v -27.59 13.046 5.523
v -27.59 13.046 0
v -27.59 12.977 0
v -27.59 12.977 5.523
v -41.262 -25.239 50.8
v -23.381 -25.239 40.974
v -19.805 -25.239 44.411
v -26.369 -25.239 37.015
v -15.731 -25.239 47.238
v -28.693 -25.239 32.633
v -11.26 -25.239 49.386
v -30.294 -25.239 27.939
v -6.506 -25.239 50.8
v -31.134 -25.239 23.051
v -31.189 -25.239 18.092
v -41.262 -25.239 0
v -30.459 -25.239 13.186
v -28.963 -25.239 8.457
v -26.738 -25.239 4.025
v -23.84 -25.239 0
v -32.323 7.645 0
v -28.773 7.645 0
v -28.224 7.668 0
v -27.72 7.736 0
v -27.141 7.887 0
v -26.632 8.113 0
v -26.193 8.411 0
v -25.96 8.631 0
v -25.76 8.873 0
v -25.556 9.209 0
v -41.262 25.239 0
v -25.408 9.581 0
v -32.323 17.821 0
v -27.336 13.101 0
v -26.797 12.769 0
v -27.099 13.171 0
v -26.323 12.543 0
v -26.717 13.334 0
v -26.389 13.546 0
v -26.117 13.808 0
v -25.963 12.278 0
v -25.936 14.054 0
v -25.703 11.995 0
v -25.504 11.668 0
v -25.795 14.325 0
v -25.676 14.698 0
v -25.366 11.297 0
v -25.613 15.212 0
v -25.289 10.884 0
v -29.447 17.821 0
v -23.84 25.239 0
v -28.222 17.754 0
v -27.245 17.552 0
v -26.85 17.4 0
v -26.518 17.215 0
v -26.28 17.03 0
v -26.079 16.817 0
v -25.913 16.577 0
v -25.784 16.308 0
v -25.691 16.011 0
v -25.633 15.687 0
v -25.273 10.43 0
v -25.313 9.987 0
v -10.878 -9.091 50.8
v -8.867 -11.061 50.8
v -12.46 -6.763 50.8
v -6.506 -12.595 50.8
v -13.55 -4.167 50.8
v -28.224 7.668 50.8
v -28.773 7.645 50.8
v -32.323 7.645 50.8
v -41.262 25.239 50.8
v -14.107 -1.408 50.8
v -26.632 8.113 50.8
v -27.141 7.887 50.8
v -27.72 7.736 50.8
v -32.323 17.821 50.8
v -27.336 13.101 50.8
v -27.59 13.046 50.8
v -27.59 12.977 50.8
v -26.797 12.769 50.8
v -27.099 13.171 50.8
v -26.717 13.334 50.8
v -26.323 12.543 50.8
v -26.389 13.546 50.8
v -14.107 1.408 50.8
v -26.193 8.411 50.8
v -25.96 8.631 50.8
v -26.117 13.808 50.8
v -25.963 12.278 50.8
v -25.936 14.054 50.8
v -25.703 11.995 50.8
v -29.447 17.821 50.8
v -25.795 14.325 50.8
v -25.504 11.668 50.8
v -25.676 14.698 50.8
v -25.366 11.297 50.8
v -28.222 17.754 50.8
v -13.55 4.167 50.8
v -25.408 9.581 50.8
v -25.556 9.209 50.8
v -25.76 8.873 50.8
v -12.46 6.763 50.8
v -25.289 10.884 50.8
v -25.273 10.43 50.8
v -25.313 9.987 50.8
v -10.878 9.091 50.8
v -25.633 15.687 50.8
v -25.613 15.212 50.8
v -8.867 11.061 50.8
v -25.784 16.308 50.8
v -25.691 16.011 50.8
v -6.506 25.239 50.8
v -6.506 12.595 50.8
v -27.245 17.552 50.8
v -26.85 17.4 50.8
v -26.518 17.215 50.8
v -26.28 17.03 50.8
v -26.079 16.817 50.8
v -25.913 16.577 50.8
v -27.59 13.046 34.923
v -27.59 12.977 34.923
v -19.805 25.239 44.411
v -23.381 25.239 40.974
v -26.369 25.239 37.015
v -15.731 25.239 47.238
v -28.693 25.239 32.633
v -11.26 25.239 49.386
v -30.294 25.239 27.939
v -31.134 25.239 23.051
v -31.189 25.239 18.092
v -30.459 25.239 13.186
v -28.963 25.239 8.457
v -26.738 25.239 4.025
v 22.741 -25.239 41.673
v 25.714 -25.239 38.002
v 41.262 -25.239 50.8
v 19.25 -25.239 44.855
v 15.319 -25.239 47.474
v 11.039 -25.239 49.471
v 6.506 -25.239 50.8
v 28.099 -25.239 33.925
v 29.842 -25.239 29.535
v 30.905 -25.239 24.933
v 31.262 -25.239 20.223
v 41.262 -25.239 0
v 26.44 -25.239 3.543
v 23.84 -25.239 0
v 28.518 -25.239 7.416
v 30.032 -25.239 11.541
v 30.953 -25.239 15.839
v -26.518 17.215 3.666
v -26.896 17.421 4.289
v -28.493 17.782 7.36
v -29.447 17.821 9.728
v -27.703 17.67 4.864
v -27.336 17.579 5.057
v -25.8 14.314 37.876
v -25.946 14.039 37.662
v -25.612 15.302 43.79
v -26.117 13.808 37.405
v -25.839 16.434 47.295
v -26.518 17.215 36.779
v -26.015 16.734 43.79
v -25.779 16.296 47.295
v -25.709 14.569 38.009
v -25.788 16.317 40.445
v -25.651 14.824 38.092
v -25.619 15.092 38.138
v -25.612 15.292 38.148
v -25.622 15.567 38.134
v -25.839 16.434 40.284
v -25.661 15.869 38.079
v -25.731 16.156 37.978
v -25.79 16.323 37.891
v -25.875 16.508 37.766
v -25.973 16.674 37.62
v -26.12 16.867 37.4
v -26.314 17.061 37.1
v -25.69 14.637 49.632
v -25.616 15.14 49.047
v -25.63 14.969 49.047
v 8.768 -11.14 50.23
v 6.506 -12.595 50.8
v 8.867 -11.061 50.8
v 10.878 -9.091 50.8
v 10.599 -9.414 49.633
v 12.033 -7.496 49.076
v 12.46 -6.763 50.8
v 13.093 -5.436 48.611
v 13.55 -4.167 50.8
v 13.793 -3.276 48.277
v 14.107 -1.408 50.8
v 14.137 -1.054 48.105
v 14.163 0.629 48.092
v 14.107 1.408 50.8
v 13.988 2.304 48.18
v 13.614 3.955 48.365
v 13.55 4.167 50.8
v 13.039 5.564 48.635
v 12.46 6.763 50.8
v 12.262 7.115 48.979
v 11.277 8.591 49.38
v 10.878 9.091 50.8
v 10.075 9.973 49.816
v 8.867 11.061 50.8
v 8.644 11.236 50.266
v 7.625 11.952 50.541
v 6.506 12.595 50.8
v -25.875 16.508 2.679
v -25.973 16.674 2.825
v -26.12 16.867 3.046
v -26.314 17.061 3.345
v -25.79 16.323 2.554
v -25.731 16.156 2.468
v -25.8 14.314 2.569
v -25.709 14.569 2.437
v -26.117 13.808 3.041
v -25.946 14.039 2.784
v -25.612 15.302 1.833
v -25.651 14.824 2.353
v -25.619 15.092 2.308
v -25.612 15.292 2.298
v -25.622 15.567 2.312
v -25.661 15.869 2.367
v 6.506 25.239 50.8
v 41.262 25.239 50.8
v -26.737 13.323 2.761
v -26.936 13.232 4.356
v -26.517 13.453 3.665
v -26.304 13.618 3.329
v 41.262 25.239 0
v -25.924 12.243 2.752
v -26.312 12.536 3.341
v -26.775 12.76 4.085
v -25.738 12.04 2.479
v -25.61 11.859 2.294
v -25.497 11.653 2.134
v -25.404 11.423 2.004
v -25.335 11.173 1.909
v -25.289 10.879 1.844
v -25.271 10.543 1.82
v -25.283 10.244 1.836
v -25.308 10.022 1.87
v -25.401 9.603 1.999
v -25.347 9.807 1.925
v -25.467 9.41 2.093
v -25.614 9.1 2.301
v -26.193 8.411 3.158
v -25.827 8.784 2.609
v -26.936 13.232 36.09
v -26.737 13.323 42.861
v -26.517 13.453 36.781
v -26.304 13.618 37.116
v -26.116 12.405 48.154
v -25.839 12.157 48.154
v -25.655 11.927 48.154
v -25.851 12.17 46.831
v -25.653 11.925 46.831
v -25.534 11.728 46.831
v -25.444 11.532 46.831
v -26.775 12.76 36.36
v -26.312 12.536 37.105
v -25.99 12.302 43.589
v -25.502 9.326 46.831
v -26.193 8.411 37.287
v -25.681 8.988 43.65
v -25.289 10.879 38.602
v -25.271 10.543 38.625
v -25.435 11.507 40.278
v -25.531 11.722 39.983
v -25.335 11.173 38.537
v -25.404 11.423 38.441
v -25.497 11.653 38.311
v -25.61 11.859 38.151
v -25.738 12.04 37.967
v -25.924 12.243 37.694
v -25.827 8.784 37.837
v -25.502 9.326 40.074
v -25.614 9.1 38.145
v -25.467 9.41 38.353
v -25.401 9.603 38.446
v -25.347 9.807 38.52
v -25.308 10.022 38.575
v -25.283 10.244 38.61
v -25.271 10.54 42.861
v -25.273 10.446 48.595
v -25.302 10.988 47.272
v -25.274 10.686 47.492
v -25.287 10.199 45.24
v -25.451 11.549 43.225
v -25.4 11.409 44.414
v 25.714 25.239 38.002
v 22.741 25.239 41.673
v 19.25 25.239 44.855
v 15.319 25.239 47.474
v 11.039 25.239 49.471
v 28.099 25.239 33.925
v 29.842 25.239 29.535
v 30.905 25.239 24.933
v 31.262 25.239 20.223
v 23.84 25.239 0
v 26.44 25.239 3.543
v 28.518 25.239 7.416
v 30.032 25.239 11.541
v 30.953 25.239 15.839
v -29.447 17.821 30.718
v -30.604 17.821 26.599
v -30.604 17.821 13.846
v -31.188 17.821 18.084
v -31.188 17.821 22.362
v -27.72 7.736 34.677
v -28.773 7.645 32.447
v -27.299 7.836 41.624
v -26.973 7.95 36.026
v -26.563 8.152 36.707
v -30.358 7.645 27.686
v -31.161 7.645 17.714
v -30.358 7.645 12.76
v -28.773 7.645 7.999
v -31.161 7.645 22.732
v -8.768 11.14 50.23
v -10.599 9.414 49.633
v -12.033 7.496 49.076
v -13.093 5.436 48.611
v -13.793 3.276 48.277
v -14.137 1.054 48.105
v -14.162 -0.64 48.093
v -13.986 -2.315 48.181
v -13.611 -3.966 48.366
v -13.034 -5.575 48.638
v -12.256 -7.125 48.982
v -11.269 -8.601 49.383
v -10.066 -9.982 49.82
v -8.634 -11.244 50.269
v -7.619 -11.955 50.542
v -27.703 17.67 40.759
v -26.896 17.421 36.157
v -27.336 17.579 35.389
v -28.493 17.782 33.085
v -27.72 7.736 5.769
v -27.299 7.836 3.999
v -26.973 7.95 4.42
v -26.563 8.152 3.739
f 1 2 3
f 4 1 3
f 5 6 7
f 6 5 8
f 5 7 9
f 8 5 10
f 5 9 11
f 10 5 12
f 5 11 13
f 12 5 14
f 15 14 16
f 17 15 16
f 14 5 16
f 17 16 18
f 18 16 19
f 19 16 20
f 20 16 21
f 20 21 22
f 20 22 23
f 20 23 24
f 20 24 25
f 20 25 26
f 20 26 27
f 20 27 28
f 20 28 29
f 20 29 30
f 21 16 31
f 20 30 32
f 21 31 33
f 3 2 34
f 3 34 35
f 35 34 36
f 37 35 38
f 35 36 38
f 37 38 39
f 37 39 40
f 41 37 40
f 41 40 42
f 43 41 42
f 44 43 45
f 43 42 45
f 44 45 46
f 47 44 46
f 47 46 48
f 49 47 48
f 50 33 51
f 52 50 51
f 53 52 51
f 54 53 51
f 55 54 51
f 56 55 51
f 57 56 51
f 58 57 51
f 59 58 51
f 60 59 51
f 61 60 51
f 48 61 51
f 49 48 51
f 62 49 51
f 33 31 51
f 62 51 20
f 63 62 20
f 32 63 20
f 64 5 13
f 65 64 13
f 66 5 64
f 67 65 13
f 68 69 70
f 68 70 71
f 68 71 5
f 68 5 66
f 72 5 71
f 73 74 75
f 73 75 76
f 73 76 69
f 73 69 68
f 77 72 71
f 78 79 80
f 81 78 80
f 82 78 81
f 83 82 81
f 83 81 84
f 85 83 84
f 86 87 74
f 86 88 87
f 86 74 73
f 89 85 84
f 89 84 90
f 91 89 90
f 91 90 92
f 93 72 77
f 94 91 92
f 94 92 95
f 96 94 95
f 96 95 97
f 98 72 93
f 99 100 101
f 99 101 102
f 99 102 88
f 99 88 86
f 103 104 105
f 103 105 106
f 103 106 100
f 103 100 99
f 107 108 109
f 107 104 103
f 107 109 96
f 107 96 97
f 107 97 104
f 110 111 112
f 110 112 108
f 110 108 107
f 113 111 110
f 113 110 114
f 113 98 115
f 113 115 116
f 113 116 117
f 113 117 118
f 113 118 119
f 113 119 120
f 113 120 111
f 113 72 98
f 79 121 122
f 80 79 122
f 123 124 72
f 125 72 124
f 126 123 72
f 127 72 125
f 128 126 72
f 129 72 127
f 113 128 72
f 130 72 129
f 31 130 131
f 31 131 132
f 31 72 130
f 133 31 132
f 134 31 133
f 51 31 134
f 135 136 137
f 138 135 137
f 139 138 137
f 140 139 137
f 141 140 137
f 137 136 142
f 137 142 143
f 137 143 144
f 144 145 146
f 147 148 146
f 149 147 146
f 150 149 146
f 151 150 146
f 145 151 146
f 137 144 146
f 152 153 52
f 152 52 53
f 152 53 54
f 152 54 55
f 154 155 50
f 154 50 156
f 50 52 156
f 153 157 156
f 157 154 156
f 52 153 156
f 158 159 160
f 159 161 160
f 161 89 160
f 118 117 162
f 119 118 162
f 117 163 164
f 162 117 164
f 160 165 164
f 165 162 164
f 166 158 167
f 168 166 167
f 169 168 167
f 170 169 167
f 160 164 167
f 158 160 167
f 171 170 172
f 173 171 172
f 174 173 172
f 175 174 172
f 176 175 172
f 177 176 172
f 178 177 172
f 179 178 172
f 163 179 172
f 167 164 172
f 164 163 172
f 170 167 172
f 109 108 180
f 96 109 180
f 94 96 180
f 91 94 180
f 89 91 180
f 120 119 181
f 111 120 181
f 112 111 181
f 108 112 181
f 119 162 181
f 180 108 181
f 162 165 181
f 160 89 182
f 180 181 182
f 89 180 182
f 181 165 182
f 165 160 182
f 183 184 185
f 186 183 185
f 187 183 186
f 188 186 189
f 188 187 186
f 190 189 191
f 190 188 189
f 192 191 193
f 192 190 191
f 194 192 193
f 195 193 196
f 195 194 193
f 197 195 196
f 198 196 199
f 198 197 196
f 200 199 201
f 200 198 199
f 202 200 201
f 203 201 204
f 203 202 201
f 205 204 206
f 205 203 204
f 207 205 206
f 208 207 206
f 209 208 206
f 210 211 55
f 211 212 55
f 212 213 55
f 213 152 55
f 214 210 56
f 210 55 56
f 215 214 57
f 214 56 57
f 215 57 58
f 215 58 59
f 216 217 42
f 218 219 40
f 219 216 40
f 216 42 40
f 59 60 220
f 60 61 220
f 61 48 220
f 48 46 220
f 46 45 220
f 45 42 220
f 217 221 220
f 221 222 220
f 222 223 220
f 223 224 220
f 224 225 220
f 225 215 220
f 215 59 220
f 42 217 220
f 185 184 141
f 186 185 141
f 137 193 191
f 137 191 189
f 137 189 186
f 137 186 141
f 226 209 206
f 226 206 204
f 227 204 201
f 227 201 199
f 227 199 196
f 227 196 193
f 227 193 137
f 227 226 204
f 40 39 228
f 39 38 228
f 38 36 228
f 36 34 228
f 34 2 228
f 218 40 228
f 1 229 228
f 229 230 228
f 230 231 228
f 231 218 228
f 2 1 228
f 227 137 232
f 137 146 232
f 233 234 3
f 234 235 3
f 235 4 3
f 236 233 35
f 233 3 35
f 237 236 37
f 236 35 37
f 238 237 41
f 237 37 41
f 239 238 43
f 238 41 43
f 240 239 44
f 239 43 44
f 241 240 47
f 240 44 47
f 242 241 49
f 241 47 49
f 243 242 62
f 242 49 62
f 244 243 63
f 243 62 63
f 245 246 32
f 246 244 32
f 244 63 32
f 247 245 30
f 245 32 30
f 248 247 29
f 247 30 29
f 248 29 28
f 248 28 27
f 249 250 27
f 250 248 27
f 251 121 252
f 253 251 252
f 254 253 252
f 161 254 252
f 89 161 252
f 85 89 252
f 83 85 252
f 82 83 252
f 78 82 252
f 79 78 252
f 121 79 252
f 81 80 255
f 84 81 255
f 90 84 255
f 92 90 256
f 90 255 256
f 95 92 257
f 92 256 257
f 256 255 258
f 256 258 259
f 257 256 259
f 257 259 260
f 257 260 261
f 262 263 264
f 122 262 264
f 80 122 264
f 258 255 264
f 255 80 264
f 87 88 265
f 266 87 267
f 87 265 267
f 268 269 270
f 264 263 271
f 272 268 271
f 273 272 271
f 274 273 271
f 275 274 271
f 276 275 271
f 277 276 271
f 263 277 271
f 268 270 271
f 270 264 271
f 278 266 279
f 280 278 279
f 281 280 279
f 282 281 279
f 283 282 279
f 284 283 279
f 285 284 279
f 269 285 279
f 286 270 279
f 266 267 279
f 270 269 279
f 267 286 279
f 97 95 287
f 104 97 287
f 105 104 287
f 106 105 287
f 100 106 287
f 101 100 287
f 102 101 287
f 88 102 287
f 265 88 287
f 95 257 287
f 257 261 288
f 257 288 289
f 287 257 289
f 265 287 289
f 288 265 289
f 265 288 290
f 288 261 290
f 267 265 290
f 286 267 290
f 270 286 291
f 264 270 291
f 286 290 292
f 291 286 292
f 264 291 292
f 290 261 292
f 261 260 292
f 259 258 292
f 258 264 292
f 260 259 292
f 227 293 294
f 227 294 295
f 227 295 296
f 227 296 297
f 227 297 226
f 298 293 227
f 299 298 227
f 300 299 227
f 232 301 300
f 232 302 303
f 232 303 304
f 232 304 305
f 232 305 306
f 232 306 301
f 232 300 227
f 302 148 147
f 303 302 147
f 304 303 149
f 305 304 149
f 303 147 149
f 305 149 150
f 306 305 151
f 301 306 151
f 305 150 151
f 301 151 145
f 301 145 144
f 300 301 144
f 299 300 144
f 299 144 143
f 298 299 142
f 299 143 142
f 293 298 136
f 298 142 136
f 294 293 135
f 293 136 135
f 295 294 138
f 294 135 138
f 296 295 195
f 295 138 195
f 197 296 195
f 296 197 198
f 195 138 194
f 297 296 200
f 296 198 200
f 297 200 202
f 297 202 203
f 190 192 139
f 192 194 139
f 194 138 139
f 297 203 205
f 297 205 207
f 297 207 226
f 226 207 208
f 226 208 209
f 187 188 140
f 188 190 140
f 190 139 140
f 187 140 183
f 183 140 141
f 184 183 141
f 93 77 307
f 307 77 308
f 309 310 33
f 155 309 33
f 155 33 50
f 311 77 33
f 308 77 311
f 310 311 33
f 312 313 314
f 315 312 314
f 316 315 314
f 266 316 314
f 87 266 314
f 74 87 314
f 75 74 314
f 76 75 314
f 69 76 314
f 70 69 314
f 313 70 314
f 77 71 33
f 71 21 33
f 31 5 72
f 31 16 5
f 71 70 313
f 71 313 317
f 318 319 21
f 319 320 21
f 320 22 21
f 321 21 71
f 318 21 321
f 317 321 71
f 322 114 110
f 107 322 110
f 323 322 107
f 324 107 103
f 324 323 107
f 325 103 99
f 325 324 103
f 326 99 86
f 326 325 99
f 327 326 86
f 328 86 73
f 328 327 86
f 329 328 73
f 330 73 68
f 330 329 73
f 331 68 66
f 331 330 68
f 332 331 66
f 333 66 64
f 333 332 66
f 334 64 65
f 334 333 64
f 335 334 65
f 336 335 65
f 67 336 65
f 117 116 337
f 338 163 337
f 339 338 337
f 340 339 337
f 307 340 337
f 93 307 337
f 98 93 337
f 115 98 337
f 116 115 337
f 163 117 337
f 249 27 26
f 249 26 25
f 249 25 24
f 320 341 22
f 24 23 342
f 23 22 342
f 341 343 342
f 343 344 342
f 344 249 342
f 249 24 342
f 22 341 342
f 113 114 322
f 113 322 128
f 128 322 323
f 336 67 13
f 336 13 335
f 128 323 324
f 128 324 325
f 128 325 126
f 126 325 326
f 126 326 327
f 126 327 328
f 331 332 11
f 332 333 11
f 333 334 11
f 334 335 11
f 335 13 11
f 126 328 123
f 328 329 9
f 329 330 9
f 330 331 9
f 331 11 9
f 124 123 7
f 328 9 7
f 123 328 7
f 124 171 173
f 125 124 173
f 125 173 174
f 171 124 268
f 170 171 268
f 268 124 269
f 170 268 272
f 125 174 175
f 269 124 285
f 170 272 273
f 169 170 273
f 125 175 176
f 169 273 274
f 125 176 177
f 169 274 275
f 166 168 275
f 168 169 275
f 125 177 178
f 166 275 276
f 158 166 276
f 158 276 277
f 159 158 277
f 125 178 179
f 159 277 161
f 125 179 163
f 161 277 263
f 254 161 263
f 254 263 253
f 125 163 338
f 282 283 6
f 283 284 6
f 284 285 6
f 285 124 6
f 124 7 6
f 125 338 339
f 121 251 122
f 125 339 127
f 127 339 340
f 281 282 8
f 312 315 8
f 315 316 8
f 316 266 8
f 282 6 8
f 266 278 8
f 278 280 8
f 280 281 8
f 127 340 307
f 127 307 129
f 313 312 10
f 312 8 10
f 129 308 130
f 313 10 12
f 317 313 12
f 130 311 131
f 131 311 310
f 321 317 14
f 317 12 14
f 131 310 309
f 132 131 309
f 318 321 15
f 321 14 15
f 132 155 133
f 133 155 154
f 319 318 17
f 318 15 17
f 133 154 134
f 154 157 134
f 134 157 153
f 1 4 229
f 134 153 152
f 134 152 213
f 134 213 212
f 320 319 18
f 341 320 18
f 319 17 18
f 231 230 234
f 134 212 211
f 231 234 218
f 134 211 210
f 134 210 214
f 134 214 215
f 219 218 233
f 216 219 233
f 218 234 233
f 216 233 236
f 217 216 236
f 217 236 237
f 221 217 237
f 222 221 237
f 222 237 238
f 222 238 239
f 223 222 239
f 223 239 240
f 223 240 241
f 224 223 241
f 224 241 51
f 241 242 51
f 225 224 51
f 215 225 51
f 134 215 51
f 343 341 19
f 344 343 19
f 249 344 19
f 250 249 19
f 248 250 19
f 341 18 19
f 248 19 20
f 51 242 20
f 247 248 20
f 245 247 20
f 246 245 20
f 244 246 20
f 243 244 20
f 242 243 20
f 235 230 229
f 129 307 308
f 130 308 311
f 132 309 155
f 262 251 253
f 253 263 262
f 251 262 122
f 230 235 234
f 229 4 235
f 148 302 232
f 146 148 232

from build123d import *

# Parameters (mm, degrees)
F0_W     = 82.5234055519
F0_H     = 50.4775159061
F0_R     = 14.1766268271
F1_DEPTH = 25.4
F2_W     = 82.5234055519
F2_H     = 50.4775159061
F2_R     = 14.1766268271
F3_DEPTH = 25.4
F5_DEPTH = 68.072


with BuildPart() as f1:
    # F0 (on Top) → F1 (new body)
    with BuildSketch(Plane.XY):
        Rectangle(F0_W, F0_H)
        with BuildLine():
            Line((-32.3227967278, 7.6449345797), (-32.3227967278, 17.8211357318))
            Line((-32.3227967278, 17.8211357318), (-29.4474463913, 17.8211357318))
            add(Edge.make_bspline(
                [(-29.4474463913, 17.8211357318), (-27.4228968515, 17.8211357318), (-26.517528988, 17.215329929)],
                knots=[0, 0, 0, 1, 1, 1], degree=2))
            add(Edge.make_bspline(
                [(-26.517528988, 17.215329929), (-25.6121611245, 16.6095241261), (-25.6121611245, 15.30214175)],
                knots=[0, 0, 0, 1, 1, 1], degree=2))
            add(Edge.make_bspline(
                [(-25.6121611245, 15.30214175), (-25.6121611245, 14.3956602729), (-26.1166280891, 13.8076722877)],
                knots=[0, 0, 0, 1, 1, 1], degree=2))
            add(Edge.make_bspline(
                [(-26.1166280891, 13.8076722877), (-26.6210950536, 13.2196843026), (-27.5899388928, 13.0459605797)],
                knots=[0, 0, 0, 1, 1, 1], degree=2))
            Line((-27.5899388928, 13.0459605797), (-27.5899388928, 12.976916536))
            add(Edge.make_bspline(
                [(-27.5899388928, 12.976916536), (-25.2713953604, 12.5804700915), (-25.2713953604, 10.5403299612)],
                knots=[0, 0, 0, 1, 1, 1], degree=2))
            add(Edge.make_bspline(
                [(-25.2713953604, 10.5403299612), (-25.2713953604, 9.1772669047), (-26.193467428, 8.4111007422)],
                knots=[0, 0, 0, 1, 1, 1], degree=2))
            add(Edge.make_bspline(
                [(-26.193467428, 8.4111007422), (-27.1155394957, 7.6449345797), (-28.7725965447, 7.6449345797)],
                knots=[0, 0, 0, 1, 1, 1], degree=2))
            Line((-28.7725965447, 7.6449345797), (-32.3227967278, 7.6449345797))
        make_face(mode=Mode.SUBTRACT)
        Circle(F0_R, mode=Mode.SUBTRACT)
    extrude(amount=F1_DEPTH)

    # F2 (on face) → F3 (join)
    with BuildSketch(Plane.XY.offset(25.4)):
        Rectangle(F2_W, F2_H)
        with BuildLine():
            Line((-28.7725965447, 7.6449345797), (-32.3227967278, 7.6449345797))
            Line((-32.3227967278, 7.6449345797), (-32.3227967278, 17.8211357318))
            Line((-32.3227967278, 17.8211357318), (-29.4474463913, 17.8211357318))
            add(Edge.make_bspline(
                [(-29.4474463913, 17.8211357318), (-27.4228968515, 17.8211357318), (-26.517528988, 17.215329929)],
                knots=[0, 0, 0, 1, 1, 1], degree=2))
            add(Edge.make_bspline(
                [(-26.517528988, 17.215329929), (-25.6121611245, 16.6095241261), (-25.6121611245, 15.30214175)],
                knots=[0, 0, 0, 1, 1, 1], degree=2))
            add(Edge.make_bspline(
                [(-25.6121611245, 15.30214175), (-25.6121611245, 14.3956602729), (-26.1166280891, 13.8076722877)],
                knots=[0, 0, 0, 1, 1, 1], degree=2))
            add(Edge.make_bspline(
                [(-26.1166280891, 13.8076722877), (-26.6210950536, 13.2196843026), (-27.5899388928, 13.0459605797)],
                knots=[0, 0, 0, 1, 1, 1], degree=2))
            Line((-27.5899388928, 13.0459605797), (-27.5899388928, 12.976916536))
            add(Edge.make_bspline(
                [(-27.5899388928, 12.976916536), (-25.2713953604, 12.5804700915), (-25.2713953604, 10.5403299612)],
                knots=[0, 0, 0, 1, 1, 1], degree=2))
            add(Edge.make_bspline(
                [(-25.2713953604, 10.5403299612), (-25.2713953604, 9.1772669047), (-26.193467428, 8.4111007422)],
                knots=[0, 0, 0, 1, 1, 1], degree=2))
            add(Edge.make_bspline(
                [(-26.193467428, 8.4111007422), (-27.1155394957, 7.6449345797), (-28.7725965447, 7.6449345797)],
                knots=[0, 0, 0, 1, 1, 1], degree=2))
        make_face(mode=Mode.SUBTRACT)
        Circle(F2_R, mode=Mode.SUBTRACT)
    extrude(amount=F3_DEPTH)

    # F4 (on face) → F5 (cut)
    with BuildSketch(Plane.XZ.offset(25.238757953)):
        with BuildLine():
            Line((-6.5062351096, 50.8), (6.5062351096, 50.8))
            ThreePointArc((6.5062351096, 50.8), (0, 51.4845386637), (-6.5062351096, 50.8))
        make_face()
        with BuildLine():
            ThreePointArc((23.8396931421, 0), (29.3476017907, 9.451933902), (31.261702776, 20.2228358877))
            ThreePointArc((31.261702776, 20.2228358877), (24.2970167782, 39.8938560985), (6.5062351096, 50.8))
            Line((6.5062351096, 50.8), (-6.5062351096, 50.8))
            ThreePointArc((-6.5062351096, 50.8), (-29.5868017935, 30.3181427224), (-23.8396931421, 0))
            Line((-23.8396931421, 0), (23.8396931421, 0))
        make_face()
    extrude(amount=-F5_DEPTH, mode=Mode.SUBTRACT)


solid = f1.part
